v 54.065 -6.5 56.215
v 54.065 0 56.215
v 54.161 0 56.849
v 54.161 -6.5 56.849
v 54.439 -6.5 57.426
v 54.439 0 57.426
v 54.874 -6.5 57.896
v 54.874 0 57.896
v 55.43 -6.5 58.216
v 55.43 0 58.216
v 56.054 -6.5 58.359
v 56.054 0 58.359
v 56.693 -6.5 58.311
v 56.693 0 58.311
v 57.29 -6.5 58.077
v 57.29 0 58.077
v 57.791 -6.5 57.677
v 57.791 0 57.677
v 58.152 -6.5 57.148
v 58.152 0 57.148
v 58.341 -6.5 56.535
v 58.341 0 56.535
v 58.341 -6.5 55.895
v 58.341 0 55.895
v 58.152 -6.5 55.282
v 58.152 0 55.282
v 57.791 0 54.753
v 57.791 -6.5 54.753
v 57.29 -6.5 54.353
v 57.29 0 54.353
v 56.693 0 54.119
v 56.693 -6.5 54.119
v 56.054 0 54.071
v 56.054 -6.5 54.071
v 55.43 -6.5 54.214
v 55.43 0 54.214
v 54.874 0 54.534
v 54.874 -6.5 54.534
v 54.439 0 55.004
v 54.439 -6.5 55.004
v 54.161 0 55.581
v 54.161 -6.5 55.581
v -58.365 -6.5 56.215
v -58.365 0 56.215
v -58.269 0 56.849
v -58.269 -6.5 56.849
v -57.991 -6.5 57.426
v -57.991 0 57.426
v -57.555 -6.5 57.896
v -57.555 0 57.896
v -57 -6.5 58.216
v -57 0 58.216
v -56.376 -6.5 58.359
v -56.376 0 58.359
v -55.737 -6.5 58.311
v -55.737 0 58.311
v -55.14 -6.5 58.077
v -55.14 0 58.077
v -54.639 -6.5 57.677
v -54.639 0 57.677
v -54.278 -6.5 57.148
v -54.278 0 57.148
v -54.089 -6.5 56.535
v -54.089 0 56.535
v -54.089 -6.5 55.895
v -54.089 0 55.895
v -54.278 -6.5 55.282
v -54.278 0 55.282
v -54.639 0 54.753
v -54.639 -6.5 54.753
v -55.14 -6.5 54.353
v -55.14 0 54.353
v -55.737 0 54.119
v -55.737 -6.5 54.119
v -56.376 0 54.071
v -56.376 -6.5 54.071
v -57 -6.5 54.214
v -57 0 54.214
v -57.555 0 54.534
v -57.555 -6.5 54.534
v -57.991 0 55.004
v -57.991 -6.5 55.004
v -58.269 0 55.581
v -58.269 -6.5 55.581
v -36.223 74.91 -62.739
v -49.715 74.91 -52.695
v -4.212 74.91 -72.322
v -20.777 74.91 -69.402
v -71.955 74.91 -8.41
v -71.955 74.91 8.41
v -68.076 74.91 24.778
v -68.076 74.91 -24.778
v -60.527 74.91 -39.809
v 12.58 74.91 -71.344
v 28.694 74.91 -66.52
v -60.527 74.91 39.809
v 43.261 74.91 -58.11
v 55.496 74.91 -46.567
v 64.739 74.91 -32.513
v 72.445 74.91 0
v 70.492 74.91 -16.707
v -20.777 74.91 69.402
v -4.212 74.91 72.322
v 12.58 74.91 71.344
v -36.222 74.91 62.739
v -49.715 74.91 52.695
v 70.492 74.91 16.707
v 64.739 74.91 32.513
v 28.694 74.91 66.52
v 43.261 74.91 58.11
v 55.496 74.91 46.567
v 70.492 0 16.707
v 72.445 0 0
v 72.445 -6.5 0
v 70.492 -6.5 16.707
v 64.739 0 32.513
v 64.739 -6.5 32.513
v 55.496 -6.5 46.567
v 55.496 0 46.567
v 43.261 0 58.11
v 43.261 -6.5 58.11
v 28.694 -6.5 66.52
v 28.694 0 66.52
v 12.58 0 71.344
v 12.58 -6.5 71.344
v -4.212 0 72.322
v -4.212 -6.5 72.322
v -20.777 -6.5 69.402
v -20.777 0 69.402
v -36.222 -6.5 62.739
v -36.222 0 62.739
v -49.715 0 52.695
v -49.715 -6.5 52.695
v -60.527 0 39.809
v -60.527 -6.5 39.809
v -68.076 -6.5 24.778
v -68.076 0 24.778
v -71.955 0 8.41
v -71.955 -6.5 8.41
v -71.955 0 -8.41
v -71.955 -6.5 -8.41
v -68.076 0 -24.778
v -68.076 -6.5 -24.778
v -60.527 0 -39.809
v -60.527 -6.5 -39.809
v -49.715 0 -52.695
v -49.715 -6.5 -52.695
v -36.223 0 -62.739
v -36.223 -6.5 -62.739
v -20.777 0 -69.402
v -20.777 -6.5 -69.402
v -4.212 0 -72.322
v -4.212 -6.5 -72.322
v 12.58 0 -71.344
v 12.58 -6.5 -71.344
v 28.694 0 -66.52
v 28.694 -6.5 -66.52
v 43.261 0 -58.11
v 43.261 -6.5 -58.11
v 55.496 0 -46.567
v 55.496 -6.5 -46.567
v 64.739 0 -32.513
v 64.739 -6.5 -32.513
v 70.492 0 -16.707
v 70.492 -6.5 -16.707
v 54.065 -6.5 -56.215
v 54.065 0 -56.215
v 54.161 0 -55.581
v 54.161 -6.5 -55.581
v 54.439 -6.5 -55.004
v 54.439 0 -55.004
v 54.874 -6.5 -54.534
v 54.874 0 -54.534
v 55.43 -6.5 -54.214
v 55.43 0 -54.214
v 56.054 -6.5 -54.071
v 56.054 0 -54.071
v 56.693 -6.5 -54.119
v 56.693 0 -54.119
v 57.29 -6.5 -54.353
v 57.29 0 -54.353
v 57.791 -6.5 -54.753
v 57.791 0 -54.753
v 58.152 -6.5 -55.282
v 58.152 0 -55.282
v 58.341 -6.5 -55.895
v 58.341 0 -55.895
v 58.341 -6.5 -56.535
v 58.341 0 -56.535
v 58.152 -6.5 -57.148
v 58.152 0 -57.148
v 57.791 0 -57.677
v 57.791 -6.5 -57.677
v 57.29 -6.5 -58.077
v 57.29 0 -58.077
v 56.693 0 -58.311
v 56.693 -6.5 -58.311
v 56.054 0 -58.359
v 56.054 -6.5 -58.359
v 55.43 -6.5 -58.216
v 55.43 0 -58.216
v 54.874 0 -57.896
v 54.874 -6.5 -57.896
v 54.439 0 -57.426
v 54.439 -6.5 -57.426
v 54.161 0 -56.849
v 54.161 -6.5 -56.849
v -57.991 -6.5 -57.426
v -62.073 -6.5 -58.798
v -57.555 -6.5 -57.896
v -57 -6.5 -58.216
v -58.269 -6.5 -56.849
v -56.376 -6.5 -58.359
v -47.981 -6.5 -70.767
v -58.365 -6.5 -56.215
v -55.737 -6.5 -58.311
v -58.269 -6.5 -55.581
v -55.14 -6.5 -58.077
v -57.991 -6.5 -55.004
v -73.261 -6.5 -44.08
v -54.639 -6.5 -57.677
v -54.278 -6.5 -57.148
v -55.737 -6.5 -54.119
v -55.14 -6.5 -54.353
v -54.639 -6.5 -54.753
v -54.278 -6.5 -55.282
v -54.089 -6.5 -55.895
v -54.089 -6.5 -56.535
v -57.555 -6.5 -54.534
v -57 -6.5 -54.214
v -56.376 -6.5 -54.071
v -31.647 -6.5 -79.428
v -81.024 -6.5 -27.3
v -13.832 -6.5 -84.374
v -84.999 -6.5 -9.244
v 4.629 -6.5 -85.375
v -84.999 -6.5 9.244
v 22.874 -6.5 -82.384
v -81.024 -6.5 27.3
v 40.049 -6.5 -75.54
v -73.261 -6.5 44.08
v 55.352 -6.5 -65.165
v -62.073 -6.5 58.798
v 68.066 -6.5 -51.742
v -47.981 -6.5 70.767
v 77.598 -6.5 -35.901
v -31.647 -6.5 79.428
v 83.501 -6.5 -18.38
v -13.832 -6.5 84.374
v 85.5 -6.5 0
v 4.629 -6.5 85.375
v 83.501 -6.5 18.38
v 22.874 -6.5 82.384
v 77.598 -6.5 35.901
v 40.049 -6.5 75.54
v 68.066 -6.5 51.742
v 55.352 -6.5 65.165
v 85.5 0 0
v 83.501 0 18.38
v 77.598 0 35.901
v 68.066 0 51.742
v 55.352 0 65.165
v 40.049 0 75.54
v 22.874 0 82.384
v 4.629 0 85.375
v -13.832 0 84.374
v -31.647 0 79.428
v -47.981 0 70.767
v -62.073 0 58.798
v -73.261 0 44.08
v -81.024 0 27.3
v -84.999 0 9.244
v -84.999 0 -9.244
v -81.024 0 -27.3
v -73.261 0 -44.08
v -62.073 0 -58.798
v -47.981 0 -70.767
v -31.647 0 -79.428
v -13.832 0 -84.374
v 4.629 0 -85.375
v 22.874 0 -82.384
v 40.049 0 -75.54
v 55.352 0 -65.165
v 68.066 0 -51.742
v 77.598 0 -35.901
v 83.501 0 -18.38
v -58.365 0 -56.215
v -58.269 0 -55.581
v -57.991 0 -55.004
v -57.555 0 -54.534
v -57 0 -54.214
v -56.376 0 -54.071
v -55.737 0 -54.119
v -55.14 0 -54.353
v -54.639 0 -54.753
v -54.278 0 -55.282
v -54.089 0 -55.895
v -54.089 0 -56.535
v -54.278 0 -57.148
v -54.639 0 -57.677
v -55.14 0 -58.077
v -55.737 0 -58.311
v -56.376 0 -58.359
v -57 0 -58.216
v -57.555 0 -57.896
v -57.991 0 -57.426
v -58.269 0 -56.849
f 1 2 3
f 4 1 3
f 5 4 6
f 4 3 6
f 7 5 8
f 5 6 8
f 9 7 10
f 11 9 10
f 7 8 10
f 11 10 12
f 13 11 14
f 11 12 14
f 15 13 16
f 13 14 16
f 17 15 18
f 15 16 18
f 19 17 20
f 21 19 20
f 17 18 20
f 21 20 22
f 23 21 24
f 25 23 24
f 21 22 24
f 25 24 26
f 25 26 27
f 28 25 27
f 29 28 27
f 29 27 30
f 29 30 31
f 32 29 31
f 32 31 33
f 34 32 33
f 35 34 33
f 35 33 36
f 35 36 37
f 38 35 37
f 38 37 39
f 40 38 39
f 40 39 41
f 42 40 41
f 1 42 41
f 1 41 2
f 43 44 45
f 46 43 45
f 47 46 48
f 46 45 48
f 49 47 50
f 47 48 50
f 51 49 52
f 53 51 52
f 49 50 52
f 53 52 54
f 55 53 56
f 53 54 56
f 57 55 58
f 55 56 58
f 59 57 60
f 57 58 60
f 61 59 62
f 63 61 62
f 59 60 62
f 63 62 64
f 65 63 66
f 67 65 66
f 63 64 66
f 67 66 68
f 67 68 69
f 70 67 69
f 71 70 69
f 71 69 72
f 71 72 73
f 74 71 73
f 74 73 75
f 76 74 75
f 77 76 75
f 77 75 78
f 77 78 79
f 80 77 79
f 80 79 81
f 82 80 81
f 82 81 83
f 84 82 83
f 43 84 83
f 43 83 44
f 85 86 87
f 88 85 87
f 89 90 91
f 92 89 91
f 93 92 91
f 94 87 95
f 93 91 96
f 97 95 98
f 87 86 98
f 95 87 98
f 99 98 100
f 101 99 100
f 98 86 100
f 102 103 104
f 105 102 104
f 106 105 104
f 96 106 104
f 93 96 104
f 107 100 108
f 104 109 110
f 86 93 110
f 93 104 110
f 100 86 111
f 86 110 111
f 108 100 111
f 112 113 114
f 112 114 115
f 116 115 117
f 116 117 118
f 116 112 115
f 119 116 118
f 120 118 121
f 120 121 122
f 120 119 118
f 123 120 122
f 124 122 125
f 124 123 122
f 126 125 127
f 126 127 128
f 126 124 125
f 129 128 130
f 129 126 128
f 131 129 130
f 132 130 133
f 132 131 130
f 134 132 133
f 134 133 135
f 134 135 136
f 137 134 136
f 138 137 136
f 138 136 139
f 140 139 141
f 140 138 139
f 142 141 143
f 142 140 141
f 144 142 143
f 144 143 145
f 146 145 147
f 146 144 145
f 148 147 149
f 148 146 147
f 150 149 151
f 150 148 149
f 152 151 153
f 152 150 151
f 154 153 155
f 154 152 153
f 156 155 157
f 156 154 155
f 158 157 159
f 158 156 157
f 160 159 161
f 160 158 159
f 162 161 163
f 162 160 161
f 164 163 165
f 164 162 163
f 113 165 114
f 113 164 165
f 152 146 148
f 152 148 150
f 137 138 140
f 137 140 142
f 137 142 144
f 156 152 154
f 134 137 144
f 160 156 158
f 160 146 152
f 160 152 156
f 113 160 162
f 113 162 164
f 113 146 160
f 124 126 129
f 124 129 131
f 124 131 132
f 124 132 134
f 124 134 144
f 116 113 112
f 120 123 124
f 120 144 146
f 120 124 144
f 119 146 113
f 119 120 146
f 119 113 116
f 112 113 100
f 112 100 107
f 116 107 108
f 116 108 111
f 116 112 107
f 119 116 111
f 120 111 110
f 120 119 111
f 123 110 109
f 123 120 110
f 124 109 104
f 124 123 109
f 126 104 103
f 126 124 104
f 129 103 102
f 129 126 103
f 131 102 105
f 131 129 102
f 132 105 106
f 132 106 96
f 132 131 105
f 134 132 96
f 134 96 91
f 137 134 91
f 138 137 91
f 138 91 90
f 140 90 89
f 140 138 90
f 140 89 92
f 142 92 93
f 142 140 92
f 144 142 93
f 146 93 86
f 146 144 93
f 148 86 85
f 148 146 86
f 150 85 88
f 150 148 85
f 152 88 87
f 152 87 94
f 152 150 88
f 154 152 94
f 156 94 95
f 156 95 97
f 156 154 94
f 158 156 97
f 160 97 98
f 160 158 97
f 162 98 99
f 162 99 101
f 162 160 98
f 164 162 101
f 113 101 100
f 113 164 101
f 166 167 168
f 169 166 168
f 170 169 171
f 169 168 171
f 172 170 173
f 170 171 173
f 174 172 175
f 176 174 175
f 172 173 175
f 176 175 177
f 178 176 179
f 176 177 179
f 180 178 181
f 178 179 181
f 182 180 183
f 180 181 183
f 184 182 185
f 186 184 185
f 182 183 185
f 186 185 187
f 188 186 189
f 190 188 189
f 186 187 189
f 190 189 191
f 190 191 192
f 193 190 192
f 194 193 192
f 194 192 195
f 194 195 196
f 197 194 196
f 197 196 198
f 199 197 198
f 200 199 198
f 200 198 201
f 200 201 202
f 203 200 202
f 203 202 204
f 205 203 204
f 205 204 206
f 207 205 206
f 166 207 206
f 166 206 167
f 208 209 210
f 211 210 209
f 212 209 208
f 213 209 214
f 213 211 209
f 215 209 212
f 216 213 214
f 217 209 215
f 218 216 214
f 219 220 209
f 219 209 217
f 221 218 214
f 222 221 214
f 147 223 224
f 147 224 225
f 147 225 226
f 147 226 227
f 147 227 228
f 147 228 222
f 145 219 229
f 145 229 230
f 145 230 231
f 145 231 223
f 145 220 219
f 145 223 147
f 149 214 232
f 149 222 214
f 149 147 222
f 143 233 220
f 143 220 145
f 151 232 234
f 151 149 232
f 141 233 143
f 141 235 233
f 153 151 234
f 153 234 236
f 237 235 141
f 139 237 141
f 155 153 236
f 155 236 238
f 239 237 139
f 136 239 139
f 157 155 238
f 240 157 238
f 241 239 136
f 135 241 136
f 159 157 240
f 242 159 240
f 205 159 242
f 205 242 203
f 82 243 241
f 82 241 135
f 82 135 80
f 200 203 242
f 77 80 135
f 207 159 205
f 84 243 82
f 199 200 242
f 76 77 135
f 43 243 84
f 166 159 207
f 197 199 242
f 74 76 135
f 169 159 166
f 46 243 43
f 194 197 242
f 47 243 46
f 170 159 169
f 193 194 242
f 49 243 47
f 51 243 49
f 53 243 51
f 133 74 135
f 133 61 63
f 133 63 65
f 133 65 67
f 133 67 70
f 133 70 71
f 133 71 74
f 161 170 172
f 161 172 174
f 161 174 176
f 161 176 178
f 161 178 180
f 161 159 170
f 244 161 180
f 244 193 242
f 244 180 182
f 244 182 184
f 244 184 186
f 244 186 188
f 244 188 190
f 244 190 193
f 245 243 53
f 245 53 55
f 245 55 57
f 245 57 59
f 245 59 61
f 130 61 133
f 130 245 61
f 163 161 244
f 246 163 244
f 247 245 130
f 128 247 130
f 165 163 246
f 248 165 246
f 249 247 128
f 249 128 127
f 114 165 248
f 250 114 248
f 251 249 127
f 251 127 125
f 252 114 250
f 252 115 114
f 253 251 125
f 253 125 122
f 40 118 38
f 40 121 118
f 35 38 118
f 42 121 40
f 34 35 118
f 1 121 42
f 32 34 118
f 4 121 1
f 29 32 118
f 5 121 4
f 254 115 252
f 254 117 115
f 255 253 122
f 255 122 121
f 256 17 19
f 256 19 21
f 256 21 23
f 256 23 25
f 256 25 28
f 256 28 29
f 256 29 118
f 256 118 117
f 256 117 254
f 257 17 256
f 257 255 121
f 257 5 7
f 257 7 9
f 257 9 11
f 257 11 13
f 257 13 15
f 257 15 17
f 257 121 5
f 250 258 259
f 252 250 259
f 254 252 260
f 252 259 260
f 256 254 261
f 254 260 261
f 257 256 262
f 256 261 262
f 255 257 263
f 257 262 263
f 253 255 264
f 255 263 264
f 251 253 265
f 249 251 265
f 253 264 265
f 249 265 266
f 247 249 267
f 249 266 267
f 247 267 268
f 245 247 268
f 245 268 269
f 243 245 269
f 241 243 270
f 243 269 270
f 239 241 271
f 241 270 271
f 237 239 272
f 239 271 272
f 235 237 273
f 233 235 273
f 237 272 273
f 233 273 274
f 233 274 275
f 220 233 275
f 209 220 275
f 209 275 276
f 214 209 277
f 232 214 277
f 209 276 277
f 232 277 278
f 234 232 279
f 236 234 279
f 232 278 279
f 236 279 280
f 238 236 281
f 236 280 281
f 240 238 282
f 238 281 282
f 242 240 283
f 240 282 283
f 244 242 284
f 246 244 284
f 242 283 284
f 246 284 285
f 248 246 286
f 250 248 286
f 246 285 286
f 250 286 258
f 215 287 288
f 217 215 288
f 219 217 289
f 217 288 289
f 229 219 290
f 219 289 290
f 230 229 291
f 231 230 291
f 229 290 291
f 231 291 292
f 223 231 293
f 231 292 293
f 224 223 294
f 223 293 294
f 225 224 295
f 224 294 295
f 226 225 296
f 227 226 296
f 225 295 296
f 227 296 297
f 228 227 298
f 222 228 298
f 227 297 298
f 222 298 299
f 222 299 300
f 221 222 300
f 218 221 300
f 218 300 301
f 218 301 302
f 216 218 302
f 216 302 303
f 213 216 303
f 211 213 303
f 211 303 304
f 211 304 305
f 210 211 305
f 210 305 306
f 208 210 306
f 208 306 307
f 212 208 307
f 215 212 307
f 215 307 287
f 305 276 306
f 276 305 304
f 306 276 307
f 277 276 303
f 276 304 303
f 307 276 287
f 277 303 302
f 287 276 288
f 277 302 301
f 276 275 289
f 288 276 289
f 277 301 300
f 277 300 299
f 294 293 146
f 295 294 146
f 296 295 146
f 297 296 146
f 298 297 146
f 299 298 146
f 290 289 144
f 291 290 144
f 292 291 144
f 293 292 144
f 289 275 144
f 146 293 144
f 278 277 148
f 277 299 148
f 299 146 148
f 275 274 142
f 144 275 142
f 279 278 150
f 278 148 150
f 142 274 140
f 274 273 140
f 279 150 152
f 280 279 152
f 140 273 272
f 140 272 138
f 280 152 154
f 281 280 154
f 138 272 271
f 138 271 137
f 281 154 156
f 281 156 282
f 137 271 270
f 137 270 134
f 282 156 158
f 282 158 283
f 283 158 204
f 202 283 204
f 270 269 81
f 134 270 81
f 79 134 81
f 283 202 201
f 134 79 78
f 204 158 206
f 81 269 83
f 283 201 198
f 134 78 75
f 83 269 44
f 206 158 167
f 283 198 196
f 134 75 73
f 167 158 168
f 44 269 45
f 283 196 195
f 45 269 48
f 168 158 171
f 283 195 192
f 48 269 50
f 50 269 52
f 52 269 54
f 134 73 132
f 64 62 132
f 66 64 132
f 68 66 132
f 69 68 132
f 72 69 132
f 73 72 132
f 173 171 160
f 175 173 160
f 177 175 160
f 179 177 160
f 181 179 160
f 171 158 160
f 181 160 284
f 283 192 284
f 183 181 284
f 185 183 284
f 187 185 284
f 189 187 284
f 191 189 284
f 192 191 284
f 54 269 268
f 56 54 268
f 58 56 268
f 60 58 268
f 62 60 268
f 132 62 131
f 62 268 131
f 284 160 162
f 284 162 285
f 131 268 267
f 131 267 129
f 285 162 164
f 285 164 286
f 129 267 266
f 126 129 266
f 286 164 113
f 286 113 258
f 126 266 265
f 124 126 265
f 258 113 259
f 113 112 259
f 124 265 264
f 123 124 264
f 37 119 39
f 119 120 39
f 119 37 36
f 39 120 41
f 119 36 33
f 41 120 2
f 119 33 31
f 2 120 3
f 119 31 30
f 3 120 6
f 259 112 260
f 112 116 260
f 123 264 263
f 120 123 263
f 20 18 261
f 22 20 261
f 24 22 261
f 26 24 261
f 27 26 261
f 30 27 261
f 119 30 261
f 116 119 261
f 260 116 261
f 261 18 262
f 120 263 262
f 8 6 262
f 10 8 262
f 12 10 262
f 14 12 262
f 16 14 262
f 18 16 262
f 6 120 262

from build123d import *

# Parameters (mm, degrees)
F0_R     = 85.5
F0_R_2   = 79.5
F0_R_3   = 72.445
F1_DEPTH = 6.5
F3_DEPTH = 74.91
F4_D     = 4.3
F4_DEPTH = 6.5
F5_D     = 4.3
F5_DEPTH = 6.5
F6_D     = 4.3
F6_DEPTH = 6.5
F7_D     = 4.3
F7_DEPTH = 6.5


with BuildPart() as f1:
    # F0 (on Front) → F1 (new body)
    with BuildSketch(Plane.XZ):
        Circle(F0_R)
        Circle(F0_R_2, mode=Mode.SUBTRACT)
        Circle(F0_R_2)
        Circle(F0_R_3, mode=Mode.SUBTRACT)
    extrude(amount=F1_DEPTH)

    # F4
    with Locations(Plane.XZ.offset(6.5)):
        with Locations((-56.214989, 56.214989)):
            Hole(F4_D / 2, depth=F4_DEPTH)

    # F5
    with Locations(Plane.XZ.offset(6.5)):
        with Locations((56.214989, 56.214989)):
            Hole(F5_D / 2, depth=F5_DEPTH)

    # F6
    with Locations(Plane.XZ.offset(6.5)):
        with Locations((56.214989, -56.214989)):
            Hole(F6_D / 2, depth=F6_DEPTH)

    # F7
    with Locations(Plane.XZ.offset(6.5)):
        with Locations((-56.214989, -56.214989)):
            Hole(F7_D / 2, depth=F7_DEPTH)


with BuildPart() as f3:
    # F0 (on Front) → F3 (new body)
    with BuildSketch(Plane.XZ):
        Circle(F0_R_3)
    extrude(amount=-F3_DEPTH)


solid = Compound([f1.part, f3.part])
